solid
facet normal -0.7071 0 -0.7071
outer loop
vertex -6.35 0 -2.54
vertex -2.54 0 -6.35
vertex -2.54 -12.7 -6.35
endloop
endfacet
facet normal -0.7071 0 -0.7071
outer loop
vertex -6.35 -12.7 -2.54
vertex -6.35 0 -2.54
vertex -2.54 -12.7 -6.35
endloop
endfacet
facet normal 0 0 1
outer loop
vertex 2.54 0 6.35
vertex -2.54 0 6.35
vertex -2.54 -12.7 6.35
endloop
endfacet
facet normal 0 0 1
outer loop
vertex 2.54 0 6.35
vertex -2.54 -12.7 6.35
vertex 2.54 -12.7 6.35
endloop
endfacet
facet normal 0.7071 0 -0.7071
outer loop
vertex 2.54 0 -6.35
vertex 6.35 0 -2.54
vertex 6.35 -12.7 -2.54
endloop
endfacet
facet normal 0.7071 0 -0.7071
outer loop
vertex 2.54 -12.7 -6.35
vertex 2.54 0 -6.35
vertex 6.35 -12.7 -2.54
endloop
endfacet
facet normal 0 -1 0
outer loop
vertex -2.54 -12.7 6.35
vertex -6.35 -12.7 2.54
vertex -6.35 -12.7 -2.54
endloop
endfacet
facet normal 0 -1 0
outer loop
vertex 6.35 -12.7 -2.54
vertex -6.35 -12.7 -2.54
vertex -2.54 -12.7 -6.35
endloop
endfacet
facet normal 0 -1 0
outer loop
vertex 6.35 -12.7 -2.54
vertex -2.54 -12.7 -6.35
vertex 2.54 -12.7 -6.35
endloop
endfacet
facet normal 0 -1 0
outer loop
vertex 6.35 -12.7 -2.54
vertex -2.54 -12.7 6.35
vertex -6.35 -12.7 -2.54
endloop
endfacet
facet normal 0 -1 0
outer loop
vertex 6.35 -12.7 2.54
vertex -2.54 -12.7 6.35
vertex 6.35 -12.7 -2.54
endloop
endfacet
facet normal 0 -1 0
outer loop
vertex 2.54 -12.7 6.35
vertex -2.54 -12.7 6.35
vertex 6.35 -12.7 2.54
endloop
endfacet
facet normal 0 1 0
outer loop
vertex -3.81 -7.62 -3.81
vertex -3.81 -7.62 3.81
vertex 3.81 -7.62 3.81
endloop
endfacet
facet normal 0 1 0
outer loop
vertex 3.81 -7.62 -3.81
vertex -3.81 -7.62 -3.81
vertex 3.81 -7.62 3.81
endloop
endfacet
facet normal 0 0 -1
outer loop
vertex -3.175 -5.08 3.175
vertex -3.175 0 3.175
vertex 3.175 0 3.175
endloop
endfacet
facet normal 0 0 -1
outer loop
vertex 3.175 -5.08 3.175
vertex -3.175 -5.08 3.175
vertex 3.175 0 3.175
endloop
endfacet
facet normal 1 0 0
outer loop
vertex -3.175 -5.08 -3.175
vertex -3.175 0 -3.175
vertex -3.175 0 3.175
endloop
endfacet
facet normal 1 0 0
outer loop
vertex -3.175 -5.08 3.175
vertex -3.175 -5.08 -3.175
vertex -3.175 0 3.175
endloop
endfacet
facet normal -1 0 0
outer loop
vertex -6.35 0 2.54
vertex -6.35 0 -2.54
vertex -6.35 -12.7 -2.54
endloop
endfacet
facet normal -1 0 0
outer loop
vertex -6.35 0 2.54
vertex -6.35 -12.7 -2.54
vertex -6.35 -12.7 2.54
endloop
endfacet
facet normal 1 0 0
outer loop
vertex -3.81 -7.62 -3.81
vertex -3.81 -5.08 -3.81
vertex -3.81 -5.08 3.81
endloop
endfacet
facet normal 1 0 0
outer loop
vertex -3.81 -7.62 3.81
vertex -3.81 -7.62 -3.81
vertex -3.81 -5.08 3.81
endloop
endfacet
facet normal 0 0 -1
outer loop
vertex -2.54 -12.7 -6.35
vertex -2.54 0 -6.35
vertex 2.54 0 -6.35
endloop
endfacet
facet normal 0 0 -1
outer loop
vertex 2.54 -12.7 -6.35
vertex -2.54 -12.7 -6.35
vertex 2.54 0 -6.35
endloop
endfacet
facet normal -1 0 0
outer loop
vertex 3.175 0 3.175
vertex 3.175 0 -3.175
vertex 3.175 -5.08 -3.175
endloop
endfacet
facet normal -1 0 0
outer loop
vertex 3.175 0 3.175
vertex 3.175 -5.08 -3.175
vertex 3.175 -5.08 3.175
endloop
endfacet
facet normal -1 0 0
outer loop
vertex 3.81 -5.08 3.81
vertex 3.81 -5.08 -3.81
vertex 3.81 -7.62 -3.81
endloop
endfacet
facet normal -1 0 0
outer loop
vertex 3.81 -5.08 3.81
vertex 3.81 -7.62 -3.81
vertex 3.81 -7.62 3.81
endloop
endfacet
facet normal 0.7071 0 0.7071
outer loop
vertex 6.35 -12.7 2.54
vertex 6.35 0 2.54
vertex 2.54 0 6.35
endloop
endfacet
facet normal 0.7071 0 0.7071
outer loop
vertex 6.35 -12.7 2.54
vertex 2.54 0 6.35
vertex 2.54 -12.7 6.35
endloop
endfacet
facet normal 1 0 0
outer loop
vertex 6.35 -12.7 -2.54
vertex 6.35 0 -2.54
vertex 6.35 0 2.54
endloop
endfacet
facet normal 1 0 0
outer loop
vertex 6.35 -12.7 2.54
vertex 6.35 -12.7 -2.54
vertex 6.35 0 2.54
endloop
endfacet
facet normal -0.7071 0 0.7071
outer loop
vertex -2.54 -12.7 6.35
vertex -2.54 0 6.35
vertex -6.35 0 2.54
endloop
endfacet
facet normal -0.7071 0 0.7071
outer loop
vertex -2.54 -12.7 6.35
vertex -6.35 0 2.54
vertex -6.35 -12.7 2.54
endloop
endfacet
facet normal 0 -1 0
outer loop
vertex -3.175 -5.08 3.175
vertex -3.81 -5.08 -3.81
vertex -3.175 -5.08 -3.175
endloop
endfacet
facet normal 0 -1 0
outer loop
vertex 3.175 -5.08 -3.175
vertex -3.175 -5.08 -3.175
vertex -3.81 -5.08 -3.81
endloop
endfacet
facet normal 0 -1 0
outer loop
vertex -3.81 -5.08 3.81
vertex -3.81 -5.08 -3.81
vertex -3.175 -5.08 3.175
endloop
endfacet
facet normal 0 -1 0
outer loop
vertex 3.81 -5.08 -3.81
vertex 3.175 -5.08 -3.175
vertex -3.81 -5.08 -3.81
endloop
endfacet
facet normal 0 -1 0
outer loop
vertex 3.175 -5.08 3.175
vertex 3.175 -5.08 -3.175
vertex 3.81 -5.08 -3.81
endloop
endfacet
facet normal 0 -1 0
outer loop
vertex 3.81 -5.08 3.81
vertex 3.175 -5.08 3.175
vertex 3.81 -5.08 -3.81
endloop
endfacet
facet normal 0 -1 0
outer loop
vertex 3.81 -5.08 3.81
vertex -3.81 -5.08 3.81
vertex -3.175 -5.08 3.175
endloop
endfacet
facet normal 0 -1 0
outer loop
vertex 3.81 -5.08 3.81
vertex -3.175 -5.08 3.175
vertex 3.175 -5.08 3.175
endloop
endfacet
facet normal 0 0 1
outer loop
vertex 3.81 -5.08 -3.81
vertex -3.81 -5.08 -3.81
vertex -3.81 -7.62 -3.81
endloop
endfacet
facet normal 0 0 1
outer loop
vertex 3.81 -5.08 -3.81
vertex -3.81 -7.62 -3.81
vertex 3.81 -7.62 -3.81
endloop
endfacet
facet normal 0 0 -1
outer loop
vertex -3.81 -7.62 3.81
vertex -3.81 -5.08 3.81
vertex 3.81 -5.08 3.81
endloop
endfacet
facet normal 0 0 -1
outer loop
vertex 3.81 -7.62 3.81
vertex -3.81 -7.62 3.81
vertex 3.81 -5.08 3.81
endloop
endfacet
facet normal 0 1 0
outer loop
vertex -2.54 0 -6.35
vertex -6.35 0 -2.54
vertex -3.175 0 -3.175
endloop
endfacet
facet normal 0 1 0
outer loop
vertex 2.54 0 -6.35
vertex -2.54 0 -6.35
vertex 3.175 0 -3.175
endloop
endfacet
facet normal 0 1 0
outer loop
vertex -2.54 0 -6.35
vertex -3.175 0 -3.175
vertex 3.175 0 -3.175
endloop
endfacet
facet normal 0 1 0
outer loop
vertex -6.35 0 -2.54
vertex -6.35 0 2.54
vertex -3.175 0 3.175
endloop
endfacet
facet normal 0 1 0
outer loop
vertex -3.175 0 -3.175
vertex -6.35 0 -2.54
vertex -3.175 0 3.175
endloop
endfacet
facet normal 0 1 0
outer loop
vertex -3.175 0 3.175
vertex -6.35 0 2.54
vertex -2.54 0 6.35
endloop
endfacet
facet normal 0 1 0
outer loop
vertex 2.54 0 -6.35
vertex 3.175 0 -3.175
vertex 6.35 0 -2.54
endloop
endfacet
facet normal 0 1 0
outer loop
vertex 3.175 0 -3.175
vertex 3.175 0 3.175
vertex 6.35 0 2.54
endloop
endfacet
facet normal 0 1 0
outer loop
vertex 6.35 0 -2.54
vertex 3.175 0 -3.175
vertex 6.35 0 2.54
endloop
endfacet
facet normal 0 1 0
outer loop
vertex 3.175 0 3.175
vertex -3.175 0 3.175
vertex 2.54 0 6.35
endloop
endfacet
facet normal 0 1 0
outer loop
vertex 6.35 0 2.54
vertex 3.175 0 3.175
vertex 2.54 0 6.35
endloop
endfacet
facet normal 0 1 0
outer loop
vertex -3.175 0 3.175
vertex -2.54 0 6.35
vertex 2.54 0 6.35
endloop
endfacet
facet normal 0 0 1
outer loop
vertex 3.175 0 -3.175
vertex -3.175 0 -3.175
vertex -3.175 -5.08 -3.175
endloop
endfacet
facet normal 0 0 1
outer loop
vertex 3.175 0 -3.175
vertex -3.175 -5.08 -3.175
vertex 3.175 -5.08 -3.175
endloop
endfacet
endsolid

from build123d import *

# Parameters (mm, degrees)
F0_W     = 12.7
F0_H     = 12.7
F0_W_2   = 7.62
F0_H_2   = 7.62
F0_W_3   = 6.35
F0_H_3   = 6.35
F1_DEPTH = 12.7
F2_DEPTH = 7.62
F3_DEPTH = 7.62
F4_DEPTH = 5.08
F5_SIZE  = 3.81


with BuildPart() as f1:
    # F0 (on Front) → F1 (new body)
    with BuildSketch(Plane.XZ):
        Rectangle(F0_W, F0_H)
        Rectangle(F0_W_2, F0_H_2, mode=Mode.SUBTRACT)
        Rectangle(F0_W_2, F0_H_2)
        Rectangle(F0_W_3, F0_H_3, mode=Mode.SUBTRACT)
        Rectangle(F0_W_3, F0_H_3)
    extrude(amount=F1_DEPTH)

    # F0 (on Front) → F2 (cut)
    with BuildSketch(Plane.XZ):
        Rectangle(F0_W_3, F0_H_3)
    extrude(amount=F2_DEPTH, mode=Mode.SUBTRACT)

    # F0 (on Front) → F3 (cut)
    with BuildSketch(Plane.XZ):
        Rectangle(F0_W_2, F0_H_2)
        Rectangle(F0_W_3, F0_H_3, mode=Mode.SUBTRACT)
    extrude(amount=F3_DEPTH, mode=Mode.SUBTRACT)

    # F0 (on Front) → F4 (join)
    with BuildSketch(Plane.XZ):
        Rectangle(F0_W_2, F0_H_2)
        Rectangle(F0_W_3, F0_H_3, mode=Mode.SUBTRACT)
    extrude(amount=F4_DEPTH)

    # F5
    f5_edges = [f1.edges().sort_by_distance(p)[0] for p in [
        (-6.35, -6.35, -6.35),
        (6.35, -6.35, -6.35),
        (6.35, -6.35, 6.35),
        (-6.35, -6.35, 6.35),
    ]]
    chamfer(f5_edges, length=F5_SIZE)


solid = f1.part
